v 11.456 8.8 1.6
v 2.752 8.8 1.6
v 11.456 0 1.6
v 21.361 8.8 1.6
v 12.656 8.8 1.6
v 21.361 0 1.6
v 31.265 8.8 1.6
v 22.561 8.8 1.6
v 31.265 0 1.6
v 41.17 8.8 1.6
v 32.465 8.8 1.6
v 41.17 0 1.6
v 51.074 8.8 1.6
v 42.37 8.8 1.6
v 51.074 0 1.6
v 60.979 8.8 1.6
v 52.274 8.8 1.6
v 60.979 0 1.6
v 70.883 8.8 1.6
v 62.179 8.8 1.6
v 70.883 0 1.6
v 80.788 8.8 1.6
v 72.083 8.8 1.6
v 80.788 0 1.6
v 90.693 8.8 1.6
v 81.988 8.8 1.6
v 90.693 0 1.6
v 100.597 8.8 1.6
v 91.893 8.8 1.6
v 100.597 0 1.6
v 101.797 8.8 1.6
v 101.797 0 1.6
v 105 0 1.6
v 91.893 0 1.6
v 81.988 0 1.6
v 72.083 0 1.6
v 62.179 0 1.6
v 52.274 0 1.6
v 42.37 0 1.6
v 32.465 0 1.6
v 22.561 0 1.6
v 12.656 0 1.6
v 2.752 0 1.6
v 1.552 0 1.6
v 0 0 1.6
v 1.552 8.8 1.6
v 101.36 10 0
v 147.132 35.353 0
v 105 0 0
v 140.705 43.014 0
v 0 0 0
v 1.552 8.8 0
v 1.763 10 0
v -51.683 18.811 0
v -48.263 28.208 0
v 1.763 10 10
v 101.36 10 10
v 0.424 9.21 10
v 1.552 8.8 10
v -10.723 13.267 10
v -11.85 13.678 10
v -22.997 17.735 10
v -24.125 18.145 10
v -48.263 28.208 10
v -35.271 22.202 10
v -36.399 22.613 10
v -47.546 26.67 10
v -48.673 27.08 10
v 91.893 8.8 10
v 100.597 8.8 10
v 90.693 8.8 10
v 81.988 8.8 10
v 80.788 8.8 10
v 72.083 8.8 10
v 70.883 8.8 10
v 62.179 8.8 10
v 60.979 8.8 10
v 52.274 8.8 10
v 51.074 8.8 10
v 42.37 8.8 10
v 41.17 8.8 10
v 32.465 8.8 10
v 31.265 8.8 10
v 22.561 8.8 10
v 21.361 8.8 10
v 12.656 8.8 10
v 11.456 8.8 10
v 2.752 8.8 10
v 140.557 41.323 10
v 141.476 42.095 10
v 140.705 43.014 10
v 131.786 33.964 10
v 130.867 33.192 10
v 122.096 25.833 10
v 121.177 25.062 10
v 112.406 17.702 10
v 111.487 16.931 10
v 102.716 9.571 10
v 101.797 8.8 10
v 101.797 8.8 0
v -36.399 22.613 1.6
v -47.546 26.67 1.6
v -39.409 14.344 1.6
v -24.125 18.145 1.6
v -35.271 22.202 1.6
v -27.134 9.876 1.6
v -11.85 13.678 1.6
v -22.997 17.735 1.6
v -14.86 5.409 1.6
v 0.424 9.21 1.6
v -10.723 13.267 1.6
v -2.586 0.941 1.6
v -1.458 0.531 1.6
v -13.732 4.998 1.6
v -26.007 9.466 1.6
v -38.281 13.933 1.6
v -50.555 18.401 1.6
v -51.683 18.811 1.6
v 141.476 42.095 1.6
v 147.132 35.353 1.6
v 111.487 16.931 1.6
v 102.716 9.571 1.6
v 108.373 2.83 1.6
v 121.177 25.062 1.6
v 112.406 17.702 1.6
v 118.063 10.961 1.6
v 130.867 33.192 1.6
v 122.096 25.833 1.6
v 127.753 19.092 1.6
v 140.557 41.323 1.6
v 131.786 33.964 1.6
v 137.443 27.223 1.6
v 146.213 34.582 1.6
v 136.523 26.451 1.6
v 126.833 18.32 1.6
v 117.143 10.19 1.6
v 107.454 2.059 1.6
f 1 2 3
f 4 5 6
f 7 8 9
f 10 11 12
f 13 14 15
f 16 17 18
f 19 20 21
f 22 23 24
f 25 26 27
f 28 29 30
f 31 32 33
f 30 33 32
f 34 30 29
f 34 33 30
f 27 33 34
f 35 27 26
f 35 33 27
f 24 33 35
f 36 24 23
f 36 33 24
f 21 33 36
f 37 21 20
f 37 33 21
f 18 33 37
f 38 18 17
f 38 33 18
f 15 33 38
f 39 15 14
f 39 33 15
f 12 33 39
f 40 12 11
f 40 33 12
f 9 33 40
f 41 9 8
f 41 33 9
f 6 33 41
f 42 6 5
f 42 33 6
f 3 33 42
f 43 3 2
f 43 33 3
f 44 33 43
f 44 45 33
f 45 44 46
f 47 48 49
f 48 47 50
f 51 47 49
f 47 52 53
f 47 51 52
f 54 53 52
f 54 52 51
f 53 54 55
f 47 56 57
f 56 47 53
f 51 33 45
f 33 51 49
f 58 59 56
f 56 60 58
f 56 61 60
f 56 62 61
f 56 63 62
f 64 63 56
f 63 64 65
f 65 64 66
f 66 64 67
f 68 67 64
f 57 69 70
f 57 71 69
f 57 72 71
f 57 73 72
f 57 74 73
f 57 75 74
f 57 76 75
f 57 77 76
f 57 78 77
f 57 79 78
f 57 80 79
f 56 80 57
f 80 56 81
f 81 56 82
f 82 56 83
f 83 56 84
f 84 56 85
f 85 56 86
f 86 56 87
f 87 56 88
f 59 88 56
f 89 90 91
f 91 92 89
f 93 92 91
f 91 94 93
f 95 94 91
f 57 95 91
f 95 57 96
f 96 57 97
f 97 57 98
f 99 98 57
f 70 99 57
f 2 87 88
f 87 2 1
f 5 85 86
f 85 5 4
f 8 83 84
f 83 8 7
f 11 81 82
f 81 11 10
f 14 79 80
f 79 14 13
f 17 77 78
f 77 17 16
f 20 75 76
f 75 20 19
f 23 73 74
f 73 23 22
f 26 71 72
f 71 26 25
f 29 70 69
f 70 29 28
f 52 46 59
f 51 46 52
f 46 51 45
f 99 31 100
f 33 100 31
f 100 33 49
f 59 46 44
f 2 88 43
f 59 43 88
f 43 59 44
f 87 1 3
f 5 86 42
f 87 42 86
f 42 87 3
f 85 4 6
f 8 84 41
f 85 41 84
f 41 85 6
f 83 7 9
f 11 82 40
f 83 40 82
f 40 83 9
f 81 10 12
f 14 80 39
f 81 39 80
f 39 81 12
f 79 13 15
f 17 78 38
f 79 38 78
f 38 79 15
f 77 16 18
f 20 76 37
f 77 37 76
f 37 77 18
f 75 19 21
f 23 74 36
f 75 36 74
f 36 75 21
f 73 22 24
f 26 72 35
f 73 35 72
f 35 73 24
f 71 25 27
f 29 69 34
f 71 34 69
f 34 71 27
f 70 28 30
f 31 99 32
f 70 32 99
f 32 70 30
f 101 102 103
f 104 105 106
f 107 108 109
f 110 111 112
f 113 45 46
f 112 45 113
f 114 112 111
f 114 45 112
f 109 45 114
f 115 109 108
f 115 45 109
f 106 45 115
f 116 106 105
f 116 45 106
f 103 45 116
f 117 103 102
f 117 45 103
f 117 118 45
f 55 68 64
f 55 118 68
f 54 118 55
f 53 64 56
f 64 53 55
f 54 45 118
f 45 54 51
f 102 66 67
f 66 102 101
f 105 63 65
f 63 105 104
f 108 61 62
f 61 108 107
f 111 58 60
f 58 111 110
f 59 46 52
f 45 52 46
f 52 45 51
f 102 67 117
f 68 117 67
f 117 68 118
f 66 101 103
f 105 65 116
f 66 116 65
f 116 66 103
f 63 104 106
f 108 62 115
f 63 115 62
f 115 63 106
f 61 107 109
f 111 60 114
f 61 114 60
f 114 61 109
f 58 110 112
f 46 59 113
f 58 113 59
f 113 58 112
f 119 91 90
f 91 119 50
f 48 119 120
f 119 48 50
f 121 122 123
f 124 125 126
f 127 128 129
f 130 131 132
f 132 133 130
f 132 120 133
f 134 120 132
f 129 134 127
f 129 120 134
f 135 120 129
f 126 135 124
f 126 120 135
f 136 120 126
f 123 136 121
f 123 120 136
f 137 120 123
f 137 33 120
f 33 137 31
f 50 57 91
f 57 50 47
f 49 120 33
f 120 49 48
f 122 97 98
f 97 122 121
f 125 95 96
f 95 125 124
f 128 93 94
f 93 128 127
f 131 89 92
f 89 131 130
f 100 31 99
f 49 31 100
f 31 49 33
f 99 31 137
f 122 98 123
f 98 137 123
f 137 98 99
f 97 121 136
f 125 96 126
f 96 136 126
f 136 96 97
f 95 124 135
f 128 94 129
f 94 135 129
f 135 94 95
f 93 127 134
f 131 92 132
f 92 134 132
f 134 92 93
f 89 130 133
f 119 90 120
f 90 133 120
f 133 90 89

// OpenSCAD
/*
 * Customizable LED ligts - https://www.thingiverse.com/thing:3453860
 * by Taras Kushnirenko
 * created 2019-02-26
 * version v1.1
 *
 * Changelog
 * --------------
  * v1.1 - 2019-03-05:
 *  - [feature] convert to Customizer
 *  - [feature] add left wing of the ligts
 * v1.0 - 2019-02-26:
 *  - initial design
 * --------------
 * 
 * This work is licensed under the Creative Commons - Attribution - Non-Commercial ShareAlike license.
 * https://creativecommons.org/licenses/by-nc-sa/3.0/
 */

 // Parameter Section //
//-------------------//

// preview[view:south, tilt:top diagonal]

/* [LED lights Settings] */

// The width of the LED strip 
strip_width_in_millimeter = 10.0; //[5:1:20]

// The length of the front LED lamp section
lamp_front_in_millimeter = 105.0; //[25:5:300]

// The length of the right section LED lamp
lamp_right_in_millimeter = 55.0; //[25:5:70]

// The right section angle. 0 - section disabled
lamp_right_angle = 20.0; //[0:5:90]

// The length of the left section LED lamp
lamp_left_in_millimeter = 55.0; //[25:5:70]

// The left section angle. 0 - section disabled
lamp_left_angle = 40.0; //[0:5:90]

// Wall thickness
wall_thickness = 1.2; //[0.4:0.1:5]

// Bottom thickness
bottom_thickness = 1.6; //[0.4:0.1:5]

// The number of front supports
number_of_front_supports = 10; //[2:1:90]

// The number of right supports
number_of_right_supports = 4; //[2:1:20]

// The number of left supports
number_of_left_supports = 4; //[2:1:20]

/* [Hidden] */

l=lamp_front_in_millimeter;
lR=lamp_right_in_millimeter;
lL=lamp_left_in_millimeter;
s=strip_width_in_millimeter;
sS=wall_thickness;
sB=bottom_thickness;

$fn = $preview ? 12 : 72;
//=================================
led();
//echo(tan(45));
//=================================
pP=[[0,0],[0,sB],[s-sS,s],[s,s],[s,0]]; // support profile

module led(){
  main();
  if (lamp_right_angle > 0) {
    right();
  };
  if (lamp_left_angle > 0) {
    left();
  };
};

module sup(n,l){
  for(i=[0:n]){
    translate([i*l/n,0,0])rotate([90,0,90])linear_extrude(height=sS)polygon(pP);
  };
};

module main(){
  difference(){
    union(){
      cube([l,s,sB]);
      translate([0,s-sS,0])cube([l,sS,s]);
    }; //union
    if (lamp_right_angle > 0) {
      rotate([0,0,-lamp_right_angle/2])translate([-l,-0.1,-0.1])cube([l,s+0.2,s+0.2]);
    };
    if (lamp_left_angle > 0) {
      translate([l,0,0])rotate([0,0,lamp_left_angle/2])translate([0,-0.1,-0.1])cube([s,l+0.2,s+0.2]);
    };
  }; //difference
  translate((s-sS)*[tan(lamp_right_angle/2),0,0])sup(number_of_front_supports,l-sS-(s-sS)*(tan(lamp_right_angle/2)+tan(lamp_left_angle/2)));
};

module right(){
  rotate([0,0,-lamp_right_angle])translate([-lR,0,0])union(){
    difference(){
      union() {
        cube([lR,s,sB]);
        translate([0,s-sS,0])cube([lR,sS,s]);
      }; //union
      translate([lR,0,0])rotate([0,0,lamp_right_angle/2])cube([s,s+0.2,s+0.2]);
    }; //difference
    sup(number_of_right_supports,lR-sS-(s-sS)*(tan(lamp_right_angle/2)));
  };
};
module left(){
  translate([l,0,0])rotate([0,0,lamp_left_angle])union() {
    difference(){
      union() {
        cube([lL,s,sB]);
        translate([0,s-sS,0])cube([lL,sS,s]);
      }; //union
      translate([0,0,0])rotate([0,0,90-lamp_left_angle/2])cube([l,s+0.2,s+0.2]);
    }; //difference
    translate((s-sS)*[tan(lamp_left_angle/2),0,0])sup(number_of_left_supports,lR-sS-(s-sS)*(tan(lamp_left_angle/2)));
  };
};
